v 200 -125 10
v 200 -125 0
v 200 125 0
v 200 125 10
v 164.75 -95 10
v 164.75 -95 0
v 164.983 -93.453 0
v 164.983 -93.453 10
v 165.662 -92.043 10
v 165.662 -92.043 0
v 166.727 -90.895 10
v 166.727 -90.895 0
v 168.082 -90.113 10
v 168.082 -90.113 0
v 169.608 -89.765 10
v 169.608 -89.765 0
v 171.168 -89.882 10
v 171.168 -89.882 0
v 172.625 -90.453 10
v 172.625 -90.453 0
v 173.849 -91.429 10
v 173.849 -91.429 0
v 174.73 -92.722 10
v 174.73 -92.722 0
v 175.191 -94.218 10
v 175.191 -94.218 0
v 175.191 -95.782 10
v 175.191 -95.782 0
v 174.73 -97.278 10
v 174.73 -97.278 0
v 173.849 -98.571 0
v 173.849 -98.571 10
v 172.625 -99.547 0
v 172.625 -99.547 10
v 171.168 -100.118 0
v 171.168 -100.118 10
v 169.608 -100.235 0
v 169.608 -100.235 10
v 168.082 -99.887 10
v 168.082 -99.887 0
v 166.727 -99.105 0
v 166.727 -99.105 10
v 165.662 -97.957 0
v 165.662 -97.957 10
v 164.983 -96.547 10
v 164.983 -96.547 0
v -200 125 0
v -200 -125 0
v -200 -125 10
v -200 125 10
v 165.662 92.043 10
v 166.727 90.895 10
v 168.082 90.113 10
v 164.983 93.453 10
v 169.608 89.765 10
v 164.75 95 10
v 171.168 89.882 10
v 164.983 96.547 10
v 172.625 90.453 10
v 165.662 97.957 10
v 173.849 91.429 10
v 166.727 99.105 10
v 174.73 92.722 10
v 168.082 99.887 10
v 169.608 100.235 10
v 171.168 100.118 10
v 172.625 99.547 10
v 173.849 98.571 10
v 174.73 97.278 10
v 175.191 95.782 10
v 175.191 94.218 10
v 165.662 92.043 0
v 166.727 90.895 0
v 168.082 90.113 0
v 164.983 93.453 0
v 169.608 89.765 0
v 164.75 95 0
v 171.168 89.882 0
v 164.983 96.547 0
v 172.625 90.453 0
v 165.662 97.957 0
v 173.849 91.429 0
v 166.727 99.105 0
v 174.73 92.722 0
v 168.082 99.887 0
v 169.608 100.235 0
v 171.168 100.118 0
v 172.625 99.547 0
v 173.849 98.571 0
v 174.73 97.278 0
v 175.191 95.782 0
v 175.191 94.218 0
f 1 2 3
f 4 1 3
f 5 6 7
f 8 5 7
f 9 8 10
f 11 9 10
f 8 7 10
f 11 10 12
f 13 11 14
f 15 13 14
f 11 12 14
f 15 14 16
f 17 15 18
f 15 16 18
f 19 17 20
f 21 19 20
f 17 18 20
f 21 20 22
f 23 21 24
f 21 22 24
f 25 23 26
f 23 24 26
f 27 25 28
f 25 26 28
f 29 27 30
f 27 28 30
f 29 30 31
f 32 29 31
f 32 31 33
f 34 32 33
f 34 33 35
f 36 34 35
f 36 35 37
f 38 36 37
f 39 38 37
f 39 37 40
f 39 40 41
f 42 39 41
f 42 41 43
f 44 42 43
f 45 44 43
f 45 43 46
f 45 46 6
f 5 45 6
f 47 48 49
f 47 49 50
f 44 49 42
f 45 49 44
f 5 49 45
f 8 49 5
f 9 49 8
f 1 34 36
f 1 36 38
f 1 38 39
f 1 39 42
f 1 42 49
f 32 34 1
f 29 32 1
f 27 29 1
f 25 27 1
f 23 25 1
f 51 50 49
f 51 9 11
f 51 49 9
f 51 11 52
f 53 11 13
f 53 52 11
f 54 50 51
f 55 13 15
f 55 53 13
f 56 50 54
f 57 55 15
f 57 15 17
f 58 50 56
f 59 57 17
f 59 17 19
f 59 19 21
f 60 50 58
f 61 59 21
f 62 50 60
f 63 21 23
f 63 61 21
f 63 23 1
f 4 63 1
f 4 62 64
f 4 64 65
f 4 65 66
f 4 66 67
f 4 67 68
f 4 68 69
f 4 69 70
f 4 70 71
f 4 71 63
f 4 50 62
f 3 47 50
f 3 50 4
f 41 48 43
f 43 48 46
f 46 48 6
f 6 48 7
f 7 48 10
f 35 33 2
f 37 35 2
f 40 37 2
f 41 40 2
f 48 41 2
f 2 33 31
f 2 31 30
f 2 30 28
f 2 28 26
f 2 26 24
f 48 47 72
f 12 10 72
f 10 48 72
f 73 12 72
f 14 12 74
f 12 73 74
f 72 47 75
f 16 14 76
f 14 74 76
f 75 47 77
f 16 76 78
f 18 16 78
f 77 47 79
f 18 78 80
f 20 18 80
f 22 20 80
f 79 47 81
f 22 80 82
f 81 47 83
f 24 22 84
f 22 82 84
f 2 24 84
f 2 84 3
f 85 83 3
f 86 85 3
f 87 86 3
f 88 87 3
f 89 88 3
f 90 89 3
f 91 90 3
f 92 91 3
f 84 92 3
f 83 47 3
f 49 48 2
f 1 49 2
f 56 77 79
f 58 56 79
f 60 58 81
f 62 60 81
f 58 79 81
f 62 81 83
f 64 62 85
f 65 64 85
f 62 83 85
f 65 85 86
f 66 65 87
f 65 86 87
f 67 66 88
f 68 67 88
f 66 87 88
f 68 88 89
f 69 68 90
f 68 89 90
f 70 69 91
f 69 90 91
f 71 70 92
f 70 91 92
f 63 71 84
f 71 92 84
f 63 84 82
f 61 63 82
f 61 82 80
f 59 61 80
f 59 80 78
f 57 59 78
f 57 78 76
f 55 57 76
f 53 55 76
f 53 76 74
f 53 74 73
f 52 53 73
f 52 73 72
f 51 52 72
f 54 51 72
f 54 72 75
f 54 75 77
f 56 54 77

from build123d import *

# Parameters (mm, degrees)
SKIZZE1_W                          = 400
SKIZZE1_H                          = 250
AUFSATZ_LINEAR_AUSTRAGEN1_DEPTH    = 10
F_10_5_10_5_DURCHMESSER_BOHRUNG1_D = 10.5


with BuildPart() as part:
    # Skizze1 → Aufsatz-Linear austragen1 (new body)
    with BuildSketch(Plane.XY):
        Rectangle(SKIZZE1_W, SKIZZE1_H)
    extrude(amount=AUFSATZ_LINEAR_AUSTRAGEN1_DEPTH)

    # Ø10.5 (10.5) Durchmesser Bohrung1 (through all)
    with Locations(Plane.XY.offset(10)):
        with Locations((170, 95), (170, -95)):
            Hole(F_10_5_10_5_DURCHMESSER_BOHRUNG1_D / 2)


solid = part.part
